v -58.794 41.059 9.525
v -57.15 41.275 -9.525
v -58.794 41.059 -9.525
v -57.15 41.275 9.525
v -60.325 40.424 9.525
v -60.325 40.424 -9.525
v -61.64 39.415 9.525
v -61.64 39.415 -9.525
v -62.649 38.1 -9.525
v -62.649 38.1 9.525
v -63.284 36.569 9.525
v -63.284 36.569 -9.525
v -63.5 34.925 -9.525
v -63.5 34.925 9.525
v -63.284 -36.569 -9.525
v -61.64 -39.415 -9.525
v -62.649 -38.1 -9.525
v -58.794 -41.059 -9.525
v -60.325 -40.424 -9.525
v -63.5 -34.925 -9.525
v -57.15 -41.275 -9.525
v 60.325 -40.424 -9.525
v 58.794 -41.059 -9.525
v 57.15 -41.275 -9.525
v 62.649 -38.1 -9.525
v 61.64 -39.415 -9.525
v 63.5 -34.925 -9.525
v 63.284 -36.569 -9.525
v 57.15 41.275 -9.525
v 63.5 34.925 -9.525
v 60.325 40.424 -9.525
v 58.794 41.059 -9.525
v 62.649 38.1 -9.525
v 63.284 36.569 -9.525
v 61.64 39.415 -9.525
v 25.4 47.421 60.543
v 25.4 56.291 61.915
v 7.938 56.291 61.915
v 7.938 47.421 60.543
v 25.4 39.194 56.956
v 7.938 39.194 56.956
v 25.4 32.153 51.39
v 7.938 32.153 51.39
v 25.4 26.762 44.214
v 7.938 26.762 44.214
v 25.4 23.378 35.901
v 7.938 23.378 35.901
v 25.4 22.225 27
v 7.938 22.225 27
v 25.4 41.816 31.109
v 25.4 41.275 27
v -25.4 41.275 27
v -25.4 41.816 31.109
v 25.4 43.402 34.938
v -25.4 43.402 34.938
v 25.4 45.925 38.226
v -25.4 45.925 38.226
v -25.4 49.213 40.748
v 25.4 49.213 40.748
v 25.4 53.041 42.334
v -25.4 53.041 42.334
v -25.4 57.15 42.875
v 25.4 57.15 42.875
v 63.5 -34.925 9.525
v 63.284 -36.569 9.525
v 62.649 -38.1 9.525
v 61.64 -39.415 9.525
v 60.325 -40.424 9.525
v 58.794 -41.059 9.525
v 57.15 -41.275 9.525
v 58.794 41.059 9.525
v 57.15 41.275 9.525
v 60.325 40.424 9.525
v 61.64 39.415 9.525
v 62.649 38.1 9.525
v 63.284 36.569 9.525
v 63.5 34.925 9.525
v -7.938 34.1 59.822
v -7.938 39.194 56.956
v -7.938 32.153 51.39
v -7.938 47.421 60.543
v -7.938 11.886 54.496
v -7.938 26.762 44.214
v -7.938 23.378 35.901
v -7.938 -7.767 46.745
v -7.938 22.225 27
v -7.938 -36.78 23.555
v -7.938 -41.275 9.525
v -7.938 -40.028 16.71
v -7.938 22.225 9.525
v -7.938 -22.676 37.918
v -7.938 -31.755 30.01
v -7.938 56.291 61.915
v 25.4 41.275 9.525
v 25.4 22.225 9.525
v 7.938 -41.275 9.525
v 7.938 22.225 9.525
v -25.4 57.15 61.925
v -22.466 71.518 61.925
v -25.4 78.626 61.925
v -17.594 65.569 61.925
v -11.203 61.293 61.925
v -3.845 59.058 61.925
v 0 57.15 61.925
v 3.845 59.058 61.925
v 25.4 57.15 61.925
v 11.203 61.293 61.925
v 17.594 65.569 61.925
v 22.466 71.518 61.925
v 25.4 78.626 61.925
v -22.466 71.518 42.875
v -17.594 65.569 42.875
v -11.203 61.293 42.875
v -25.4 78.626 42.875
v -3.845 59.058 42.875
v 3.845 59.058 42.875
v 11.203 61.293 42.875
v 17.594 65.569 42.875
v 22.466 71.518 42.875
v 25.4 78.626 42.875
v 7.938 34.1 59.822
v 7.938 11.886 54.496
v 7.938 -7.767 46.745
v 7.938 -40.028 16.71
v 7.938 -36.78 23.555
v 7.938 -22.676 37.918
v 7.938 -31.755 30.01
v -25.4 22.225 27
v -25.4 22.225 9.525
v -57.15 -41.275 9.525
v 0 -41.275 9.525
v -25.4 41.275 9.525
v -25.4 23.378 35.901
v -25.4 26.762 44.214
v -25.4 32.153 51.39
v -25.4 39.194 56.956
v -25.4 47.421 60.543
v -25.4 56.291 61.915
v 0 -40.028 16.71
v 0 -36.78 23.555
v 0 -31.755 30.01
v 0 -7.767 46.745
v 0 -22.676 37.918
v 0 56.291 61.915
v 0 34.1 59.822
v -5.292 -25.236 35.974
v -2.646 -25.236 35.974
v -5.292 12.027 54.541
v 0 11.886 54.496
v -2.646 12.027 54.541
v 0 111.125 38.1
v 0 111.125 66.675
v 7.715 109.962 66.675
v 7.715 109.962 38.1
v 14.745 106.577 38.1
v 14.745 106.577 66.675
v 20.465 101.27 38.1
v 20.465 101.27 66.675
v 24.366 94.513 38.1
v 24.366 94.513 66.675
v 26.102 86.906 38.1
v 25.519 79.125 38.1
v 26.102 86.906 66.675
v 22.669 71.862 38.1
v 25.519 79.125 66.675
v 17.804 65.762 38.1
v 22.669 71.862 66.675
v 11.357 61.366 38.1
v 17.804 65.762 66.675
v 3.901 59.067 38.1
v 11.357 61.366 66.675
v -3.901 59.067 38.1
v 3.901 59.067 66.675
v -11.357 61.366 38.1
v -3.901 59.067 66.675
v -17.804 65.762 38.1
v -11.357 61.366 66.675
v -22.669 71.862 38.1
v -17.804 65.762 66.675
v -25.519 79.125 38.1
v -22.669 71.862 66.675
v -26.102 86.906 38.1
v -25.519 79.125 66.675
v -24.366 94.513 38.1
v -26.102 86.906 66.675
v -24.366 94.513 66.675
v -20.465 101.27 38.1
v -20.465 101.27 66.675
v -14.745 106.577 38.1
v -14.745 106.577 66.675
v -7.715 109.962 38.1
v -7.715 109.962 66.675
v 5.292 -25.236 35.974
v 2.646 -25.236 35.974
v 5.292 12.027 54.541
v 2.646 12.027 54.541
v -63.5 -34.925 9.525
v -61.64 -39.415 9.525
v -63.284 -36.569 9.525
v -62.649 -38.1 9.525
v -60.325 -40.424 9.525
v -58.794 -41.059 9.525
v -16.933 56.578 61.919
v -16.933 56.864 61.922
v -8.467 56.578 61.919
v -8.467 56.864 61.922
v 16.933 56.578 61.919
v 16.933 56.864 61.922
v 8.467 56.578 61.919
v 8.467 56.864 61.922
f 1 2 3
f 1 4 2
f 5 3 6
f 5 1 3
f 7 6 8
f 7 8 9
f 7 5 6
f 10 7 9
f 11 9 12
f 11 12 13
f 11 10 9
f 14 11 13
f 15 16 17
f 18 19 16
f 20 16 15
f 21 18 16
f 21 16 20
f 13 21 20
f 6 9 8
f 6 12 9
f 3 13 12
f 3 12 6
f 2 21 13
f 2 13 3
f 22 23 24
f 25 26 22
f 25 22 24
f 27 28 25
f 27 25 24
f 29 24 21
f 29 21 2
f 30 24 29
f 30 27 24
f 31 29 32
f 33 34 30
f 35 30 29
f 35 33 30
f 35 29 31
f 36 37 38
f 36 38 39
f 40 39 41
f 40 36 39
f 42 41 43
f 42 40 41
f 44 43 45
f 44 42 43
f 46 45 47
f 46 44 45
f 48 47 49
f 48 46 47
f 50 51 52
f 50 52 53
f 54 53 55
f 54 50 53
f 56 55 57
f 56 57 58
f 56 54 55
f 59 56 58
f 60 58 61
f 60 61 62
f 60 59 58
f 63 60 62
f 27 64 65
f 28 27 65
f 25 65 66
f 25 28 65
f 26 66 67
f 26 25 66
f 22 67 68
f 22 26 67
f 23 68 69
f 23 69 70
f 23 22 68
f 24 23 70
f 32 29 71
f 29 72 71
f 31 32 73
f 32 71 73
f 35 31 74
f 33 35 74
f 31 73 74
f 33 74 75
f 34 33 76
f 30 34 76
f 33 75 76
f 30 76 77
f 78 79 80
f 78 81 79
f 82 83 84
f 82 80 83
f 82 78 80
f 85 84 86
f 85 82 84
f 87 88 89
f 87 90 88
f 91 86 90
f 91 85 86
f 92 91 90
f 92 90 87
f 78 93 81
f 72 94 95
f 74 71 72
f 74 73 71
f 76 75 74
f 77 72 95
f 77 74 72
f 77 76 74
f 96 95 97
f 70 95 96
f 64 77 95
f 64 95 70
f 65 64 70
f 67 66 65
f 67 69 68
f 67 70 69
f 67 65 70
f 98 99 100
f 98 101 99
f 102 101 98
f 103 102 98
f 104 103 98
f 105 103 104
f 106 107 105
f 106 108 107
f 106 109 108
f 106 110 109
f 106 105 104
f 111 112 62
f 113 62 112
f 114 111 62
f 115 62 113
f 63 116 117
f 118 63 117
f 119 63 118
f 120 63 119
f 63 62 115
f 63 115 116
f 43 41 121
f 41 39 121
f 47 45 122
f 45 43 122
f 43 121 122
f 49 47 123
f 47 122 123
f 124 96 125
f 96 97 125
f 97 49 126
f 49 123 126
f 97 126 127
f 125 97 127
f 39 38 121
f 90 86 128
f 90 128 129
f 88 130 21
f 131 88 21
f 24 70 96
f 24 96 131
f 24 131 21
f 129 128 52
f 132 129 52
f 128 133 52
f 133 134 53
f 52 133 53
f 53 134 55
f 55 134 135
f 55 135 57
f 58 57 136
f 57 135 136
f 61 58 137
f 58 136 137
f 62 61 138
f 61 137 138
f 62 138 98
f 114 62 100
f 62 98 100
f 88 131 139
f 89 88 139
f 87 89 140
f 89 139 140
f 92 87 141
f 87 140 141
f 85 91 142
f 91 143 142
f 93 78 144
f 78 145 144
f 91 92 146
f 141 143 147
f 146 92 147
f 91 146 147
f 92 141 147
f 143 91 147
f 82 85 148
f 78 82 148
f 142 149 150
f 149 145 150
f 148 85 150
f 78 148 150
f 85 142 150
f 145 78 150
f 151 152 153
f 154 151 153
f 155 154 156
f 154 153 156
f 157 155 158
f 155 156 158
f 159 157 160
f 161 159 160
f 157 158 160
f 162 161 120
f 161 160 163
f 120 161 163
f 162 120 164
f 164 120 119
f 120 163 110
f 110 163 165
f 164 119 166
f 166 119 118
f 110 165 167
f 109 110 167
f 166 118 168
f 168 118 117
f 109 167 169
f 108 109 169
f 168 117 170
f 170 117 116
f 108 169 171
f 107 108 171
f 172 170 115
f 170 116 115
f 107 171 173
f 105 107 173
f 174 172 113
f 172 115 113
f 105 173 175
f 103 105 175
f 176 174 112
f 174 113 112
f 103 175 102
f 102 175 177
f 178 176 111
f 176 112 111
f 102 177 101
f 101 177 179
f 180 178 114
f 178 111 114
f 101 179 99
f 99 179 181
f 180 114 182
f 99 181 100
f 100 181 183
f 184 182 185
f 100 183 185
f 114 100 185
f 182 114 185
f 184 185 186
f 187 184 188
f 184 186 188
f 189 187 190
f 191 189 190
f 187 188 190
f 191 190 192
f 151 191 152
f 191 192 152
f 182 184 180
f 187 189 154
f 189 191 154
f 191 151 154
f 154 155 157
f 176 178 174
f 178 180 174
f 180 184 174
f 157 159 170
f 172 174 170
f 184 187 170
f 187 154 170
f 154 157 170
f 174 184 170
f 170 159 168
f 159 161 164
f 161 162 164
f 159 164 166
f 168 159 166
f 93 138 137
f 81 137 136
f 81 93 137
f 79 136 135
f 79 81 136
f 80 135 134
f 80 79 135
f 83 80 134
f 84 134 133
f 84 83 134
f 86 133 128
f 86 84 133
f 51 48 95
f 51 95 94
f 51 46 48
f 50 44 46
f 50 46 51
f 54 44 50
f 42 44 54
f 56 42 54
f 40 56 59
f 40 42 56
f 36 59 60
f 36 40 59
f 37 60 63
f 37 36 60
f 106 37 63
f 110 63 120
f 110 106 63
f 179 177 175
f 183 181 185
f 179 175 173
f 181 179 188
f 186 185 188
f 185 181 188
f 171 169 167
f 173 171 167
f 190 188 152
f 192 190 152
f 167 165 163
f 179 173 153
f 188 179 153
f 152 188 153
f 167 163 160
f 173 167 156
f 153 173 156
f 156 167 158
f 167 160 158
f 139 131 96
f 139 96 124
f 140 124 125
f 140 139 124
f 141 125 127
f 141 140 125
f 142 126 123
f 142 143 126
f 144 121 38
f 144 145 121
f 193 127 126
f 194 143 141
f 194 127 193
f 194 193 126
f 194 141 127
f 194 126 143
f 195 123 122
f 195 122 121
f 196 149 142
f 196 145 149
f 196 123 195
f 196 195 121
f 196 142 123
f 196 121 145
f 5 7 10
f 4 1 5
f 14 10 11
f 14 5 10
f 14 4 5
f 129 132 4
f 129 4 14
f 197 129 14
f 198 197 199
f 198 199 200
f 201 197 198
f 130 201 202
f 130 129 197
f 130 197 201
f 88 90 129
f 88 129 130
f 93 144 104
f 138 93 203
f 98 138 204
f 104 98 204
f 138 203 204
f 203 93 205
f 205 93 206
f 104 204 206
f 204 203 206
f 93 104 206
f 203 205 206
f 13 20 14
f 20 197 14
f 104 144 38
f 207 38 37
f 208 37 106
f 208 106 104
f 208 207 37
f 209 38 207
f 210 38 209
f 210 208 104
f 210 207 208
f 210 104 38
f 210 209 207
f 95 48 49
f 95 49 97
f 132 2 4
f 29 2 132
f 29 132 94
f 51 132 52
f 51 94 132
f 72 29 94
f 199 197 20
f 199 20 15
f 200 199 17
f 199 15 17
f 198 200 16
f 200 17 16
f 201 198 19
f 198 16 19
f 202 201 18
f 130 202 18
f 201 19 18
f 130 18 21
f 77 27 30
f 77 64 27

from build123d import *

# Parameters (mm, degrees)
F1_DEPTH = 63.5
F0_W     = 24.6246428497
F0_H     = 19.05
F2_DEPTH = 25.4
F3_DEPTH = 7.9375
F5_R     = 6.35


with BuildPart() as f1:
    # F0 (on Right) → F1 (new body, symmetric)
    with BuildSketch(Plane.YZ):
        Polygon((-41.275, -9.525), (41.275, -9.525), (41.275, 9.525), (22.225, 9.525), (-41.275, 9.525), align=None)
    extrude(amount=F1_DEPTH, both=True)

    # F0 (on Right) → F2 (join, symmetric)
    with BuildSketch(Plane.YZ):
        with BuildLine():
            Line((22.225, 9.525), (41.275, 9.525))
            Line((41.275, 9.525), (41.275, 27.0002))
            ThreePointArc((41.275, 27.0002), (45.9246798487, 38.2255201513), (57.15, 42.8752))
            Line((57.15, 42.8752), (60.325, 42.8752))
            Line((60.325, 42.8752), (60.325, 61.9252))
            Line((60.325, 61.9252), (57.15, 61.9252))
            add(Edge.make_bspline(
                [(56.2913843938, 61.9146440632), (56.5780770871, 61.9191303195), (56.8642886028, 61.9226504349), (57.15, 61.9252)],
                knots=[110.7664159172, 110.7664159172, 110.7664159172, 110.7664159172, 111.5045361635, 111.5045361635, 111.5045361635, 111.5045361635], degree=3))
            ThreePointArc((56.2913843938, 61.9146440632), (32.1525723819, 51.3904488195), (22.225, 27.0002))
            Line((22.225, 27.0002), (22.225, 9.525))
        make_face()
        with Locations((72.6373214248, 52.4002)):
            Rectangle(F0_W, F0_H)
    extrude(amount=F2_DEPTH, both=True)

    # F0 (on Right) → F3 (join, symmetric)
    with BuildSketch(Plane.YZ):
        with BuildLine():
            add(Edge.make_bspline(
                [(-41.275, 9.525), (-40.5899635887, 38.8110076579), (13.2686895658, 61.2414115691), (56.2913843938, 61.9146440632)],
                knots=[0, 0, 0, 0, 110.7664159172, 110.7664159172, 110.7664159172, 110.7664159172], degree=3))
            Line((-41.275, 9.525), (22.225, 9.525))
            Line((22.225, 9.525), (22.225, 27.0002))
            ThreePointArc((22.225, 27.0002), (32.1525723819, 51.3904488195), (56.2913843938, 61.9146440632))
        make_face()
    extrude(amount=F3_DEPTH, both=True)

    # F0 (on Right) → F4 (revolve)
    with BuildSketch(Plane.YZ):
        Polygon((84.9496428497, 61.9252), (84.9496428497, 42.8752), (84.9496428497, 38.1), (111.125, 38.1), (111.125, 66.675), (84.9496428497, 66.675), align=None)
    revolve(axis=Axis((0, 84.9496428497, 52.3875), (0, 0, -1)))

    # F5
    f5_edges = [f1.edges().sort_by_distance(p)[0] for p in [
        (63.5, -41.275, 0),
        (63.5, 41.275, 0),
        (-63.5, 41.275, 0),
        (-63.5, -41.275, 0),
    ]]
    fillet(f5_edges, radius=F5_R)


solid = f1.part
